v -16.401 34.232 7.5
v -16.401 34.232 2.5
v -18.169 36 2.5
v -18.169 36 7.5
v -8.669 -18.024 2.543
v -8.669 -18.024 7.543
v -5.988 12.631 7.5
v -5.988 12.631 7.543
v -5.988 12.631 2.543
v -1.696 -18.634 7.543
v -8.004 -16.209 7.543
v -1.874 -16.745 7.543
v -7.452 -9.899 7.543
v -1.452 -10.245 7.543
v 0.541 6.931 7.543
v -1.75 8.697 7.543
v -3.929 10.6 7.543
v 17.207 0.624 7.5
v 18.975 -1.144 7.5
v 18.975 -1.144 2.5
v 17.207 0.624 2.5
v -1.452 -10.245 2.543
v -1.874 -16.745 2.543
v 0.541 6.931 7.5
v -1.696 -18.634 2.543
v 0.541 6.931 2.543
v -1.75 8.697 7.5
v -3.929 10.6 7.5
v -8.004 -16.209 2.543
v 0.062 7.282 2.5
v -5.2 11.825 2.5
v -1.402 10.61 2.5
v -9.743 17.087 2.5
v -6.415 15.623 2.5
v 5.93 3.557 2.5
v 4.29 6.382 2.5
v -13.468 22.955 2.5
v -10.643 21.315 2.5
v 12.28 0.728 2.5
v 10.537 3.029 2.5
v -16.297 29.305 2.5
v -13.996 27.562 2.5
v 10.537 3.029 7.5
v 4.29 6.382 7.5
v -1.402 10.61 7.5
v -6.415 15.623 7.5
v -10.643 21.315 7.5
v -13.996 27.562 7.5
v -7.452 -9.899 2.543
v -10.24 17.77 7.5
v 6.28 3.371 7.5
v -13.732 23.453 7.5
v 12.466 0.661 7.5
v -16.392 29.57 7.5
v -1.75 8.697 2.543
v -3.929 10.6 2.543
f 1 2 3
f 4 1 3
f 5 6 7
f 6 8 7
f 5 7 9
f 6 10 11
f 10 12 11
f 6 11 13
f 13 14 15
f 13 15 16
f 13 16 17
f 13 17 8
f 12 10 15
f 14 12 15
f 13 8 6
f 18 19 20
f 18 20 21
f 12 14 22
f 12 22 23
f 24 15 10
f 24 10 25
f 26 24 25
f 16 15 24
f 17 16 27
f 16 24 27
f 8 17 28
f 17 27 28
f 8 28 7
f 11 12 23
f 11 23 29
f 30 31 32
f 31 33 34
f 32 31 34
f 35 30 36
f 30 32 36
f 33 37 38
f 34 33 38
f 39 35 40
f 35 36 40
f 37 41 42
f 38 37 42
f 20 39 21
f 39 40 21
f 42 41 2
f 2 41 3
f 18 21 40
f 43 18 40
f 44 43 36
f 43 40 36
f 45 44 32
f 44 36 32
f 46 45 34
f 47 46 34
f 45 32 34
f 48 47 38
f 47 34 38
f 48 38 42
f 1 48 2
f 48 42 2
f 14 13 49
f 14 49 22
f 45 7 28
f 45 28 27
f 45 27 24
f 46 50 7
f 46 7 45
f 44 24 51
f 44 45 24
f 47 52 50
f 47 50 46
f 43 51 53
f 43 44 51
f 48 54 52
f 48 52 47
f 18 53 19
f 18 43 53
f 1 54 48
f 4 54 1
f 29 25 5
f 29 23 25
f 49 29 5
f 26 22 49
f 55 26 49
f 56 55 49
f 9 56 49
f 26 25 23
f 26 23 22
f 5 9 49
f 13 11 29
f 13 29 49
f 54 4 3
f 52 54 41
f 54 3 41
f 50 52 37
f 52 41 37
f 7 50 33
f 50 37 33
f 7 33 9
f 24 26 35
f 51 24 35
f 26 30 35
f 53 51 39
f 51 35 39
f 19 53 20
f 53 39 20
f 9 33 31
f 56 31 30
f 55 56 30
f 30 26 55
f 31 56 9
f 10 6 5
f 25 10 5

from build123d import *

# Parameters (mm, degrees)
BOSS_EXTRUDE1_DEPTH             = 10
SCALE1_SCALE                    = 0.5
BOSS_EXTRUDE2_REACH             = 46.064
BOSS_EXTRUDE2_END_RADIUS        = 47.489459432
SKETCH4_W                       = 5
SKETCH4_H                       = 7
BOSS_EXTRUDE2_DIRECTION_2_DEPTH = 20
CUT_EXTRUDE1_DEPTH              = 42.005284287


with BuildPart() as part:
    # Sketch1 → Boss-Extrude1 (new body)
    with BuildSketch(Plane.XY):
        with BuildLine():
            Line((40.984301278, -16.277292989), (37.448767372, -12.741759083))
            ThreePointArc((37.448767372, -12.741759083), (-4.964984169, 12.060025443), (-29.766768694, 54.473776984))
            Line((-29.766768694, 54.473776984), (-33.3023026, 58.00931089))
            ThreePointArc((-33.3023026, 58.00931089), (-7.365037029, 9.659972583), (40.984301278, -16.277292989))
        make_face()
    extrude(amount=BOSS_EXTRUDE1_DEPTH)


with BuildPart() as part_1:
    # Scale1: scaled about (-3.035293352, 13.98971626, 5)
    add(part.part.scale(SCALE1_SCALE).moved(Location((-1.517646676, 6.99485813, 2.5))))

    # Boss-Extrude2: up to this cylinder (the profile starts outside it)
    boss_extrude2_end = Plane(origin=(28.379953609, 45.404963221, 5.043467), z_dir=(0, 0, -1)) * Cylinder(BOSS_EXTRUDE2_END_RADIUS, 188.106918865, mode=Mode.PRIVATE)
    # Sketch4 → Boss-Extrude2 (add, up to the surface)
    with BuildSketch(Plane(origin=(7.010218182, 0.680511093, -0.258230649), x_dir=(0, 0, -1), z_dir=(0.08715574274766595, 0.9961946980917449, 0)), mode=Mode.PRIVATE) as boss_extrude2_sk1:
        with Locations((-5.301697823, 10.489820344)):
            Rectangle(SKETCH4_W, SKETCH4_H)
    boss_extrude2_tool1 = extrude(boss_extrude2_sk1.sketch, amount=BOSS_EXTRUDE2_REACH, mode=Mode.PRIVATE) - boss_extrude2_end
    add(boss_extrude2_tool1.solids().sort_by_distance((-3.439685, 1.594759, 5.043467))[0])

    # Sketch4 → Boss-Extrude2 direction 2 (add)
    with BuildSketch(Plane(origin=(7.010218182, 0.680511093, -0.258230649), x_dir=(0, 0, -1), z_dir=(0.08715574274766595, 0.9961946980917449, 0))):
        with Locations((-5.301697823, 10.489820344)):
            Rectangle(SKETCH4_W, SKETCH4_H)
    extrude(amount=-BOSS_EXTRUDE2_DIRECTION_2_DEPTH)

    # Sketch10 → Cut-Extrude1 (cut, through all)
    with BuildSketch(Plane.XY.offset(7.543467174)):
        Polygon((-8.004005245, -16.209052666), (-7.451990048, -9.899490092), (-1.451990048, -10.245322297), (-1.874415312, -16.745322297), align=None)
    extrude(amount=-CUT_EXTRUDE1_DEPTH, mode=Mode.SUBTRACT)


solid = part_1.part
